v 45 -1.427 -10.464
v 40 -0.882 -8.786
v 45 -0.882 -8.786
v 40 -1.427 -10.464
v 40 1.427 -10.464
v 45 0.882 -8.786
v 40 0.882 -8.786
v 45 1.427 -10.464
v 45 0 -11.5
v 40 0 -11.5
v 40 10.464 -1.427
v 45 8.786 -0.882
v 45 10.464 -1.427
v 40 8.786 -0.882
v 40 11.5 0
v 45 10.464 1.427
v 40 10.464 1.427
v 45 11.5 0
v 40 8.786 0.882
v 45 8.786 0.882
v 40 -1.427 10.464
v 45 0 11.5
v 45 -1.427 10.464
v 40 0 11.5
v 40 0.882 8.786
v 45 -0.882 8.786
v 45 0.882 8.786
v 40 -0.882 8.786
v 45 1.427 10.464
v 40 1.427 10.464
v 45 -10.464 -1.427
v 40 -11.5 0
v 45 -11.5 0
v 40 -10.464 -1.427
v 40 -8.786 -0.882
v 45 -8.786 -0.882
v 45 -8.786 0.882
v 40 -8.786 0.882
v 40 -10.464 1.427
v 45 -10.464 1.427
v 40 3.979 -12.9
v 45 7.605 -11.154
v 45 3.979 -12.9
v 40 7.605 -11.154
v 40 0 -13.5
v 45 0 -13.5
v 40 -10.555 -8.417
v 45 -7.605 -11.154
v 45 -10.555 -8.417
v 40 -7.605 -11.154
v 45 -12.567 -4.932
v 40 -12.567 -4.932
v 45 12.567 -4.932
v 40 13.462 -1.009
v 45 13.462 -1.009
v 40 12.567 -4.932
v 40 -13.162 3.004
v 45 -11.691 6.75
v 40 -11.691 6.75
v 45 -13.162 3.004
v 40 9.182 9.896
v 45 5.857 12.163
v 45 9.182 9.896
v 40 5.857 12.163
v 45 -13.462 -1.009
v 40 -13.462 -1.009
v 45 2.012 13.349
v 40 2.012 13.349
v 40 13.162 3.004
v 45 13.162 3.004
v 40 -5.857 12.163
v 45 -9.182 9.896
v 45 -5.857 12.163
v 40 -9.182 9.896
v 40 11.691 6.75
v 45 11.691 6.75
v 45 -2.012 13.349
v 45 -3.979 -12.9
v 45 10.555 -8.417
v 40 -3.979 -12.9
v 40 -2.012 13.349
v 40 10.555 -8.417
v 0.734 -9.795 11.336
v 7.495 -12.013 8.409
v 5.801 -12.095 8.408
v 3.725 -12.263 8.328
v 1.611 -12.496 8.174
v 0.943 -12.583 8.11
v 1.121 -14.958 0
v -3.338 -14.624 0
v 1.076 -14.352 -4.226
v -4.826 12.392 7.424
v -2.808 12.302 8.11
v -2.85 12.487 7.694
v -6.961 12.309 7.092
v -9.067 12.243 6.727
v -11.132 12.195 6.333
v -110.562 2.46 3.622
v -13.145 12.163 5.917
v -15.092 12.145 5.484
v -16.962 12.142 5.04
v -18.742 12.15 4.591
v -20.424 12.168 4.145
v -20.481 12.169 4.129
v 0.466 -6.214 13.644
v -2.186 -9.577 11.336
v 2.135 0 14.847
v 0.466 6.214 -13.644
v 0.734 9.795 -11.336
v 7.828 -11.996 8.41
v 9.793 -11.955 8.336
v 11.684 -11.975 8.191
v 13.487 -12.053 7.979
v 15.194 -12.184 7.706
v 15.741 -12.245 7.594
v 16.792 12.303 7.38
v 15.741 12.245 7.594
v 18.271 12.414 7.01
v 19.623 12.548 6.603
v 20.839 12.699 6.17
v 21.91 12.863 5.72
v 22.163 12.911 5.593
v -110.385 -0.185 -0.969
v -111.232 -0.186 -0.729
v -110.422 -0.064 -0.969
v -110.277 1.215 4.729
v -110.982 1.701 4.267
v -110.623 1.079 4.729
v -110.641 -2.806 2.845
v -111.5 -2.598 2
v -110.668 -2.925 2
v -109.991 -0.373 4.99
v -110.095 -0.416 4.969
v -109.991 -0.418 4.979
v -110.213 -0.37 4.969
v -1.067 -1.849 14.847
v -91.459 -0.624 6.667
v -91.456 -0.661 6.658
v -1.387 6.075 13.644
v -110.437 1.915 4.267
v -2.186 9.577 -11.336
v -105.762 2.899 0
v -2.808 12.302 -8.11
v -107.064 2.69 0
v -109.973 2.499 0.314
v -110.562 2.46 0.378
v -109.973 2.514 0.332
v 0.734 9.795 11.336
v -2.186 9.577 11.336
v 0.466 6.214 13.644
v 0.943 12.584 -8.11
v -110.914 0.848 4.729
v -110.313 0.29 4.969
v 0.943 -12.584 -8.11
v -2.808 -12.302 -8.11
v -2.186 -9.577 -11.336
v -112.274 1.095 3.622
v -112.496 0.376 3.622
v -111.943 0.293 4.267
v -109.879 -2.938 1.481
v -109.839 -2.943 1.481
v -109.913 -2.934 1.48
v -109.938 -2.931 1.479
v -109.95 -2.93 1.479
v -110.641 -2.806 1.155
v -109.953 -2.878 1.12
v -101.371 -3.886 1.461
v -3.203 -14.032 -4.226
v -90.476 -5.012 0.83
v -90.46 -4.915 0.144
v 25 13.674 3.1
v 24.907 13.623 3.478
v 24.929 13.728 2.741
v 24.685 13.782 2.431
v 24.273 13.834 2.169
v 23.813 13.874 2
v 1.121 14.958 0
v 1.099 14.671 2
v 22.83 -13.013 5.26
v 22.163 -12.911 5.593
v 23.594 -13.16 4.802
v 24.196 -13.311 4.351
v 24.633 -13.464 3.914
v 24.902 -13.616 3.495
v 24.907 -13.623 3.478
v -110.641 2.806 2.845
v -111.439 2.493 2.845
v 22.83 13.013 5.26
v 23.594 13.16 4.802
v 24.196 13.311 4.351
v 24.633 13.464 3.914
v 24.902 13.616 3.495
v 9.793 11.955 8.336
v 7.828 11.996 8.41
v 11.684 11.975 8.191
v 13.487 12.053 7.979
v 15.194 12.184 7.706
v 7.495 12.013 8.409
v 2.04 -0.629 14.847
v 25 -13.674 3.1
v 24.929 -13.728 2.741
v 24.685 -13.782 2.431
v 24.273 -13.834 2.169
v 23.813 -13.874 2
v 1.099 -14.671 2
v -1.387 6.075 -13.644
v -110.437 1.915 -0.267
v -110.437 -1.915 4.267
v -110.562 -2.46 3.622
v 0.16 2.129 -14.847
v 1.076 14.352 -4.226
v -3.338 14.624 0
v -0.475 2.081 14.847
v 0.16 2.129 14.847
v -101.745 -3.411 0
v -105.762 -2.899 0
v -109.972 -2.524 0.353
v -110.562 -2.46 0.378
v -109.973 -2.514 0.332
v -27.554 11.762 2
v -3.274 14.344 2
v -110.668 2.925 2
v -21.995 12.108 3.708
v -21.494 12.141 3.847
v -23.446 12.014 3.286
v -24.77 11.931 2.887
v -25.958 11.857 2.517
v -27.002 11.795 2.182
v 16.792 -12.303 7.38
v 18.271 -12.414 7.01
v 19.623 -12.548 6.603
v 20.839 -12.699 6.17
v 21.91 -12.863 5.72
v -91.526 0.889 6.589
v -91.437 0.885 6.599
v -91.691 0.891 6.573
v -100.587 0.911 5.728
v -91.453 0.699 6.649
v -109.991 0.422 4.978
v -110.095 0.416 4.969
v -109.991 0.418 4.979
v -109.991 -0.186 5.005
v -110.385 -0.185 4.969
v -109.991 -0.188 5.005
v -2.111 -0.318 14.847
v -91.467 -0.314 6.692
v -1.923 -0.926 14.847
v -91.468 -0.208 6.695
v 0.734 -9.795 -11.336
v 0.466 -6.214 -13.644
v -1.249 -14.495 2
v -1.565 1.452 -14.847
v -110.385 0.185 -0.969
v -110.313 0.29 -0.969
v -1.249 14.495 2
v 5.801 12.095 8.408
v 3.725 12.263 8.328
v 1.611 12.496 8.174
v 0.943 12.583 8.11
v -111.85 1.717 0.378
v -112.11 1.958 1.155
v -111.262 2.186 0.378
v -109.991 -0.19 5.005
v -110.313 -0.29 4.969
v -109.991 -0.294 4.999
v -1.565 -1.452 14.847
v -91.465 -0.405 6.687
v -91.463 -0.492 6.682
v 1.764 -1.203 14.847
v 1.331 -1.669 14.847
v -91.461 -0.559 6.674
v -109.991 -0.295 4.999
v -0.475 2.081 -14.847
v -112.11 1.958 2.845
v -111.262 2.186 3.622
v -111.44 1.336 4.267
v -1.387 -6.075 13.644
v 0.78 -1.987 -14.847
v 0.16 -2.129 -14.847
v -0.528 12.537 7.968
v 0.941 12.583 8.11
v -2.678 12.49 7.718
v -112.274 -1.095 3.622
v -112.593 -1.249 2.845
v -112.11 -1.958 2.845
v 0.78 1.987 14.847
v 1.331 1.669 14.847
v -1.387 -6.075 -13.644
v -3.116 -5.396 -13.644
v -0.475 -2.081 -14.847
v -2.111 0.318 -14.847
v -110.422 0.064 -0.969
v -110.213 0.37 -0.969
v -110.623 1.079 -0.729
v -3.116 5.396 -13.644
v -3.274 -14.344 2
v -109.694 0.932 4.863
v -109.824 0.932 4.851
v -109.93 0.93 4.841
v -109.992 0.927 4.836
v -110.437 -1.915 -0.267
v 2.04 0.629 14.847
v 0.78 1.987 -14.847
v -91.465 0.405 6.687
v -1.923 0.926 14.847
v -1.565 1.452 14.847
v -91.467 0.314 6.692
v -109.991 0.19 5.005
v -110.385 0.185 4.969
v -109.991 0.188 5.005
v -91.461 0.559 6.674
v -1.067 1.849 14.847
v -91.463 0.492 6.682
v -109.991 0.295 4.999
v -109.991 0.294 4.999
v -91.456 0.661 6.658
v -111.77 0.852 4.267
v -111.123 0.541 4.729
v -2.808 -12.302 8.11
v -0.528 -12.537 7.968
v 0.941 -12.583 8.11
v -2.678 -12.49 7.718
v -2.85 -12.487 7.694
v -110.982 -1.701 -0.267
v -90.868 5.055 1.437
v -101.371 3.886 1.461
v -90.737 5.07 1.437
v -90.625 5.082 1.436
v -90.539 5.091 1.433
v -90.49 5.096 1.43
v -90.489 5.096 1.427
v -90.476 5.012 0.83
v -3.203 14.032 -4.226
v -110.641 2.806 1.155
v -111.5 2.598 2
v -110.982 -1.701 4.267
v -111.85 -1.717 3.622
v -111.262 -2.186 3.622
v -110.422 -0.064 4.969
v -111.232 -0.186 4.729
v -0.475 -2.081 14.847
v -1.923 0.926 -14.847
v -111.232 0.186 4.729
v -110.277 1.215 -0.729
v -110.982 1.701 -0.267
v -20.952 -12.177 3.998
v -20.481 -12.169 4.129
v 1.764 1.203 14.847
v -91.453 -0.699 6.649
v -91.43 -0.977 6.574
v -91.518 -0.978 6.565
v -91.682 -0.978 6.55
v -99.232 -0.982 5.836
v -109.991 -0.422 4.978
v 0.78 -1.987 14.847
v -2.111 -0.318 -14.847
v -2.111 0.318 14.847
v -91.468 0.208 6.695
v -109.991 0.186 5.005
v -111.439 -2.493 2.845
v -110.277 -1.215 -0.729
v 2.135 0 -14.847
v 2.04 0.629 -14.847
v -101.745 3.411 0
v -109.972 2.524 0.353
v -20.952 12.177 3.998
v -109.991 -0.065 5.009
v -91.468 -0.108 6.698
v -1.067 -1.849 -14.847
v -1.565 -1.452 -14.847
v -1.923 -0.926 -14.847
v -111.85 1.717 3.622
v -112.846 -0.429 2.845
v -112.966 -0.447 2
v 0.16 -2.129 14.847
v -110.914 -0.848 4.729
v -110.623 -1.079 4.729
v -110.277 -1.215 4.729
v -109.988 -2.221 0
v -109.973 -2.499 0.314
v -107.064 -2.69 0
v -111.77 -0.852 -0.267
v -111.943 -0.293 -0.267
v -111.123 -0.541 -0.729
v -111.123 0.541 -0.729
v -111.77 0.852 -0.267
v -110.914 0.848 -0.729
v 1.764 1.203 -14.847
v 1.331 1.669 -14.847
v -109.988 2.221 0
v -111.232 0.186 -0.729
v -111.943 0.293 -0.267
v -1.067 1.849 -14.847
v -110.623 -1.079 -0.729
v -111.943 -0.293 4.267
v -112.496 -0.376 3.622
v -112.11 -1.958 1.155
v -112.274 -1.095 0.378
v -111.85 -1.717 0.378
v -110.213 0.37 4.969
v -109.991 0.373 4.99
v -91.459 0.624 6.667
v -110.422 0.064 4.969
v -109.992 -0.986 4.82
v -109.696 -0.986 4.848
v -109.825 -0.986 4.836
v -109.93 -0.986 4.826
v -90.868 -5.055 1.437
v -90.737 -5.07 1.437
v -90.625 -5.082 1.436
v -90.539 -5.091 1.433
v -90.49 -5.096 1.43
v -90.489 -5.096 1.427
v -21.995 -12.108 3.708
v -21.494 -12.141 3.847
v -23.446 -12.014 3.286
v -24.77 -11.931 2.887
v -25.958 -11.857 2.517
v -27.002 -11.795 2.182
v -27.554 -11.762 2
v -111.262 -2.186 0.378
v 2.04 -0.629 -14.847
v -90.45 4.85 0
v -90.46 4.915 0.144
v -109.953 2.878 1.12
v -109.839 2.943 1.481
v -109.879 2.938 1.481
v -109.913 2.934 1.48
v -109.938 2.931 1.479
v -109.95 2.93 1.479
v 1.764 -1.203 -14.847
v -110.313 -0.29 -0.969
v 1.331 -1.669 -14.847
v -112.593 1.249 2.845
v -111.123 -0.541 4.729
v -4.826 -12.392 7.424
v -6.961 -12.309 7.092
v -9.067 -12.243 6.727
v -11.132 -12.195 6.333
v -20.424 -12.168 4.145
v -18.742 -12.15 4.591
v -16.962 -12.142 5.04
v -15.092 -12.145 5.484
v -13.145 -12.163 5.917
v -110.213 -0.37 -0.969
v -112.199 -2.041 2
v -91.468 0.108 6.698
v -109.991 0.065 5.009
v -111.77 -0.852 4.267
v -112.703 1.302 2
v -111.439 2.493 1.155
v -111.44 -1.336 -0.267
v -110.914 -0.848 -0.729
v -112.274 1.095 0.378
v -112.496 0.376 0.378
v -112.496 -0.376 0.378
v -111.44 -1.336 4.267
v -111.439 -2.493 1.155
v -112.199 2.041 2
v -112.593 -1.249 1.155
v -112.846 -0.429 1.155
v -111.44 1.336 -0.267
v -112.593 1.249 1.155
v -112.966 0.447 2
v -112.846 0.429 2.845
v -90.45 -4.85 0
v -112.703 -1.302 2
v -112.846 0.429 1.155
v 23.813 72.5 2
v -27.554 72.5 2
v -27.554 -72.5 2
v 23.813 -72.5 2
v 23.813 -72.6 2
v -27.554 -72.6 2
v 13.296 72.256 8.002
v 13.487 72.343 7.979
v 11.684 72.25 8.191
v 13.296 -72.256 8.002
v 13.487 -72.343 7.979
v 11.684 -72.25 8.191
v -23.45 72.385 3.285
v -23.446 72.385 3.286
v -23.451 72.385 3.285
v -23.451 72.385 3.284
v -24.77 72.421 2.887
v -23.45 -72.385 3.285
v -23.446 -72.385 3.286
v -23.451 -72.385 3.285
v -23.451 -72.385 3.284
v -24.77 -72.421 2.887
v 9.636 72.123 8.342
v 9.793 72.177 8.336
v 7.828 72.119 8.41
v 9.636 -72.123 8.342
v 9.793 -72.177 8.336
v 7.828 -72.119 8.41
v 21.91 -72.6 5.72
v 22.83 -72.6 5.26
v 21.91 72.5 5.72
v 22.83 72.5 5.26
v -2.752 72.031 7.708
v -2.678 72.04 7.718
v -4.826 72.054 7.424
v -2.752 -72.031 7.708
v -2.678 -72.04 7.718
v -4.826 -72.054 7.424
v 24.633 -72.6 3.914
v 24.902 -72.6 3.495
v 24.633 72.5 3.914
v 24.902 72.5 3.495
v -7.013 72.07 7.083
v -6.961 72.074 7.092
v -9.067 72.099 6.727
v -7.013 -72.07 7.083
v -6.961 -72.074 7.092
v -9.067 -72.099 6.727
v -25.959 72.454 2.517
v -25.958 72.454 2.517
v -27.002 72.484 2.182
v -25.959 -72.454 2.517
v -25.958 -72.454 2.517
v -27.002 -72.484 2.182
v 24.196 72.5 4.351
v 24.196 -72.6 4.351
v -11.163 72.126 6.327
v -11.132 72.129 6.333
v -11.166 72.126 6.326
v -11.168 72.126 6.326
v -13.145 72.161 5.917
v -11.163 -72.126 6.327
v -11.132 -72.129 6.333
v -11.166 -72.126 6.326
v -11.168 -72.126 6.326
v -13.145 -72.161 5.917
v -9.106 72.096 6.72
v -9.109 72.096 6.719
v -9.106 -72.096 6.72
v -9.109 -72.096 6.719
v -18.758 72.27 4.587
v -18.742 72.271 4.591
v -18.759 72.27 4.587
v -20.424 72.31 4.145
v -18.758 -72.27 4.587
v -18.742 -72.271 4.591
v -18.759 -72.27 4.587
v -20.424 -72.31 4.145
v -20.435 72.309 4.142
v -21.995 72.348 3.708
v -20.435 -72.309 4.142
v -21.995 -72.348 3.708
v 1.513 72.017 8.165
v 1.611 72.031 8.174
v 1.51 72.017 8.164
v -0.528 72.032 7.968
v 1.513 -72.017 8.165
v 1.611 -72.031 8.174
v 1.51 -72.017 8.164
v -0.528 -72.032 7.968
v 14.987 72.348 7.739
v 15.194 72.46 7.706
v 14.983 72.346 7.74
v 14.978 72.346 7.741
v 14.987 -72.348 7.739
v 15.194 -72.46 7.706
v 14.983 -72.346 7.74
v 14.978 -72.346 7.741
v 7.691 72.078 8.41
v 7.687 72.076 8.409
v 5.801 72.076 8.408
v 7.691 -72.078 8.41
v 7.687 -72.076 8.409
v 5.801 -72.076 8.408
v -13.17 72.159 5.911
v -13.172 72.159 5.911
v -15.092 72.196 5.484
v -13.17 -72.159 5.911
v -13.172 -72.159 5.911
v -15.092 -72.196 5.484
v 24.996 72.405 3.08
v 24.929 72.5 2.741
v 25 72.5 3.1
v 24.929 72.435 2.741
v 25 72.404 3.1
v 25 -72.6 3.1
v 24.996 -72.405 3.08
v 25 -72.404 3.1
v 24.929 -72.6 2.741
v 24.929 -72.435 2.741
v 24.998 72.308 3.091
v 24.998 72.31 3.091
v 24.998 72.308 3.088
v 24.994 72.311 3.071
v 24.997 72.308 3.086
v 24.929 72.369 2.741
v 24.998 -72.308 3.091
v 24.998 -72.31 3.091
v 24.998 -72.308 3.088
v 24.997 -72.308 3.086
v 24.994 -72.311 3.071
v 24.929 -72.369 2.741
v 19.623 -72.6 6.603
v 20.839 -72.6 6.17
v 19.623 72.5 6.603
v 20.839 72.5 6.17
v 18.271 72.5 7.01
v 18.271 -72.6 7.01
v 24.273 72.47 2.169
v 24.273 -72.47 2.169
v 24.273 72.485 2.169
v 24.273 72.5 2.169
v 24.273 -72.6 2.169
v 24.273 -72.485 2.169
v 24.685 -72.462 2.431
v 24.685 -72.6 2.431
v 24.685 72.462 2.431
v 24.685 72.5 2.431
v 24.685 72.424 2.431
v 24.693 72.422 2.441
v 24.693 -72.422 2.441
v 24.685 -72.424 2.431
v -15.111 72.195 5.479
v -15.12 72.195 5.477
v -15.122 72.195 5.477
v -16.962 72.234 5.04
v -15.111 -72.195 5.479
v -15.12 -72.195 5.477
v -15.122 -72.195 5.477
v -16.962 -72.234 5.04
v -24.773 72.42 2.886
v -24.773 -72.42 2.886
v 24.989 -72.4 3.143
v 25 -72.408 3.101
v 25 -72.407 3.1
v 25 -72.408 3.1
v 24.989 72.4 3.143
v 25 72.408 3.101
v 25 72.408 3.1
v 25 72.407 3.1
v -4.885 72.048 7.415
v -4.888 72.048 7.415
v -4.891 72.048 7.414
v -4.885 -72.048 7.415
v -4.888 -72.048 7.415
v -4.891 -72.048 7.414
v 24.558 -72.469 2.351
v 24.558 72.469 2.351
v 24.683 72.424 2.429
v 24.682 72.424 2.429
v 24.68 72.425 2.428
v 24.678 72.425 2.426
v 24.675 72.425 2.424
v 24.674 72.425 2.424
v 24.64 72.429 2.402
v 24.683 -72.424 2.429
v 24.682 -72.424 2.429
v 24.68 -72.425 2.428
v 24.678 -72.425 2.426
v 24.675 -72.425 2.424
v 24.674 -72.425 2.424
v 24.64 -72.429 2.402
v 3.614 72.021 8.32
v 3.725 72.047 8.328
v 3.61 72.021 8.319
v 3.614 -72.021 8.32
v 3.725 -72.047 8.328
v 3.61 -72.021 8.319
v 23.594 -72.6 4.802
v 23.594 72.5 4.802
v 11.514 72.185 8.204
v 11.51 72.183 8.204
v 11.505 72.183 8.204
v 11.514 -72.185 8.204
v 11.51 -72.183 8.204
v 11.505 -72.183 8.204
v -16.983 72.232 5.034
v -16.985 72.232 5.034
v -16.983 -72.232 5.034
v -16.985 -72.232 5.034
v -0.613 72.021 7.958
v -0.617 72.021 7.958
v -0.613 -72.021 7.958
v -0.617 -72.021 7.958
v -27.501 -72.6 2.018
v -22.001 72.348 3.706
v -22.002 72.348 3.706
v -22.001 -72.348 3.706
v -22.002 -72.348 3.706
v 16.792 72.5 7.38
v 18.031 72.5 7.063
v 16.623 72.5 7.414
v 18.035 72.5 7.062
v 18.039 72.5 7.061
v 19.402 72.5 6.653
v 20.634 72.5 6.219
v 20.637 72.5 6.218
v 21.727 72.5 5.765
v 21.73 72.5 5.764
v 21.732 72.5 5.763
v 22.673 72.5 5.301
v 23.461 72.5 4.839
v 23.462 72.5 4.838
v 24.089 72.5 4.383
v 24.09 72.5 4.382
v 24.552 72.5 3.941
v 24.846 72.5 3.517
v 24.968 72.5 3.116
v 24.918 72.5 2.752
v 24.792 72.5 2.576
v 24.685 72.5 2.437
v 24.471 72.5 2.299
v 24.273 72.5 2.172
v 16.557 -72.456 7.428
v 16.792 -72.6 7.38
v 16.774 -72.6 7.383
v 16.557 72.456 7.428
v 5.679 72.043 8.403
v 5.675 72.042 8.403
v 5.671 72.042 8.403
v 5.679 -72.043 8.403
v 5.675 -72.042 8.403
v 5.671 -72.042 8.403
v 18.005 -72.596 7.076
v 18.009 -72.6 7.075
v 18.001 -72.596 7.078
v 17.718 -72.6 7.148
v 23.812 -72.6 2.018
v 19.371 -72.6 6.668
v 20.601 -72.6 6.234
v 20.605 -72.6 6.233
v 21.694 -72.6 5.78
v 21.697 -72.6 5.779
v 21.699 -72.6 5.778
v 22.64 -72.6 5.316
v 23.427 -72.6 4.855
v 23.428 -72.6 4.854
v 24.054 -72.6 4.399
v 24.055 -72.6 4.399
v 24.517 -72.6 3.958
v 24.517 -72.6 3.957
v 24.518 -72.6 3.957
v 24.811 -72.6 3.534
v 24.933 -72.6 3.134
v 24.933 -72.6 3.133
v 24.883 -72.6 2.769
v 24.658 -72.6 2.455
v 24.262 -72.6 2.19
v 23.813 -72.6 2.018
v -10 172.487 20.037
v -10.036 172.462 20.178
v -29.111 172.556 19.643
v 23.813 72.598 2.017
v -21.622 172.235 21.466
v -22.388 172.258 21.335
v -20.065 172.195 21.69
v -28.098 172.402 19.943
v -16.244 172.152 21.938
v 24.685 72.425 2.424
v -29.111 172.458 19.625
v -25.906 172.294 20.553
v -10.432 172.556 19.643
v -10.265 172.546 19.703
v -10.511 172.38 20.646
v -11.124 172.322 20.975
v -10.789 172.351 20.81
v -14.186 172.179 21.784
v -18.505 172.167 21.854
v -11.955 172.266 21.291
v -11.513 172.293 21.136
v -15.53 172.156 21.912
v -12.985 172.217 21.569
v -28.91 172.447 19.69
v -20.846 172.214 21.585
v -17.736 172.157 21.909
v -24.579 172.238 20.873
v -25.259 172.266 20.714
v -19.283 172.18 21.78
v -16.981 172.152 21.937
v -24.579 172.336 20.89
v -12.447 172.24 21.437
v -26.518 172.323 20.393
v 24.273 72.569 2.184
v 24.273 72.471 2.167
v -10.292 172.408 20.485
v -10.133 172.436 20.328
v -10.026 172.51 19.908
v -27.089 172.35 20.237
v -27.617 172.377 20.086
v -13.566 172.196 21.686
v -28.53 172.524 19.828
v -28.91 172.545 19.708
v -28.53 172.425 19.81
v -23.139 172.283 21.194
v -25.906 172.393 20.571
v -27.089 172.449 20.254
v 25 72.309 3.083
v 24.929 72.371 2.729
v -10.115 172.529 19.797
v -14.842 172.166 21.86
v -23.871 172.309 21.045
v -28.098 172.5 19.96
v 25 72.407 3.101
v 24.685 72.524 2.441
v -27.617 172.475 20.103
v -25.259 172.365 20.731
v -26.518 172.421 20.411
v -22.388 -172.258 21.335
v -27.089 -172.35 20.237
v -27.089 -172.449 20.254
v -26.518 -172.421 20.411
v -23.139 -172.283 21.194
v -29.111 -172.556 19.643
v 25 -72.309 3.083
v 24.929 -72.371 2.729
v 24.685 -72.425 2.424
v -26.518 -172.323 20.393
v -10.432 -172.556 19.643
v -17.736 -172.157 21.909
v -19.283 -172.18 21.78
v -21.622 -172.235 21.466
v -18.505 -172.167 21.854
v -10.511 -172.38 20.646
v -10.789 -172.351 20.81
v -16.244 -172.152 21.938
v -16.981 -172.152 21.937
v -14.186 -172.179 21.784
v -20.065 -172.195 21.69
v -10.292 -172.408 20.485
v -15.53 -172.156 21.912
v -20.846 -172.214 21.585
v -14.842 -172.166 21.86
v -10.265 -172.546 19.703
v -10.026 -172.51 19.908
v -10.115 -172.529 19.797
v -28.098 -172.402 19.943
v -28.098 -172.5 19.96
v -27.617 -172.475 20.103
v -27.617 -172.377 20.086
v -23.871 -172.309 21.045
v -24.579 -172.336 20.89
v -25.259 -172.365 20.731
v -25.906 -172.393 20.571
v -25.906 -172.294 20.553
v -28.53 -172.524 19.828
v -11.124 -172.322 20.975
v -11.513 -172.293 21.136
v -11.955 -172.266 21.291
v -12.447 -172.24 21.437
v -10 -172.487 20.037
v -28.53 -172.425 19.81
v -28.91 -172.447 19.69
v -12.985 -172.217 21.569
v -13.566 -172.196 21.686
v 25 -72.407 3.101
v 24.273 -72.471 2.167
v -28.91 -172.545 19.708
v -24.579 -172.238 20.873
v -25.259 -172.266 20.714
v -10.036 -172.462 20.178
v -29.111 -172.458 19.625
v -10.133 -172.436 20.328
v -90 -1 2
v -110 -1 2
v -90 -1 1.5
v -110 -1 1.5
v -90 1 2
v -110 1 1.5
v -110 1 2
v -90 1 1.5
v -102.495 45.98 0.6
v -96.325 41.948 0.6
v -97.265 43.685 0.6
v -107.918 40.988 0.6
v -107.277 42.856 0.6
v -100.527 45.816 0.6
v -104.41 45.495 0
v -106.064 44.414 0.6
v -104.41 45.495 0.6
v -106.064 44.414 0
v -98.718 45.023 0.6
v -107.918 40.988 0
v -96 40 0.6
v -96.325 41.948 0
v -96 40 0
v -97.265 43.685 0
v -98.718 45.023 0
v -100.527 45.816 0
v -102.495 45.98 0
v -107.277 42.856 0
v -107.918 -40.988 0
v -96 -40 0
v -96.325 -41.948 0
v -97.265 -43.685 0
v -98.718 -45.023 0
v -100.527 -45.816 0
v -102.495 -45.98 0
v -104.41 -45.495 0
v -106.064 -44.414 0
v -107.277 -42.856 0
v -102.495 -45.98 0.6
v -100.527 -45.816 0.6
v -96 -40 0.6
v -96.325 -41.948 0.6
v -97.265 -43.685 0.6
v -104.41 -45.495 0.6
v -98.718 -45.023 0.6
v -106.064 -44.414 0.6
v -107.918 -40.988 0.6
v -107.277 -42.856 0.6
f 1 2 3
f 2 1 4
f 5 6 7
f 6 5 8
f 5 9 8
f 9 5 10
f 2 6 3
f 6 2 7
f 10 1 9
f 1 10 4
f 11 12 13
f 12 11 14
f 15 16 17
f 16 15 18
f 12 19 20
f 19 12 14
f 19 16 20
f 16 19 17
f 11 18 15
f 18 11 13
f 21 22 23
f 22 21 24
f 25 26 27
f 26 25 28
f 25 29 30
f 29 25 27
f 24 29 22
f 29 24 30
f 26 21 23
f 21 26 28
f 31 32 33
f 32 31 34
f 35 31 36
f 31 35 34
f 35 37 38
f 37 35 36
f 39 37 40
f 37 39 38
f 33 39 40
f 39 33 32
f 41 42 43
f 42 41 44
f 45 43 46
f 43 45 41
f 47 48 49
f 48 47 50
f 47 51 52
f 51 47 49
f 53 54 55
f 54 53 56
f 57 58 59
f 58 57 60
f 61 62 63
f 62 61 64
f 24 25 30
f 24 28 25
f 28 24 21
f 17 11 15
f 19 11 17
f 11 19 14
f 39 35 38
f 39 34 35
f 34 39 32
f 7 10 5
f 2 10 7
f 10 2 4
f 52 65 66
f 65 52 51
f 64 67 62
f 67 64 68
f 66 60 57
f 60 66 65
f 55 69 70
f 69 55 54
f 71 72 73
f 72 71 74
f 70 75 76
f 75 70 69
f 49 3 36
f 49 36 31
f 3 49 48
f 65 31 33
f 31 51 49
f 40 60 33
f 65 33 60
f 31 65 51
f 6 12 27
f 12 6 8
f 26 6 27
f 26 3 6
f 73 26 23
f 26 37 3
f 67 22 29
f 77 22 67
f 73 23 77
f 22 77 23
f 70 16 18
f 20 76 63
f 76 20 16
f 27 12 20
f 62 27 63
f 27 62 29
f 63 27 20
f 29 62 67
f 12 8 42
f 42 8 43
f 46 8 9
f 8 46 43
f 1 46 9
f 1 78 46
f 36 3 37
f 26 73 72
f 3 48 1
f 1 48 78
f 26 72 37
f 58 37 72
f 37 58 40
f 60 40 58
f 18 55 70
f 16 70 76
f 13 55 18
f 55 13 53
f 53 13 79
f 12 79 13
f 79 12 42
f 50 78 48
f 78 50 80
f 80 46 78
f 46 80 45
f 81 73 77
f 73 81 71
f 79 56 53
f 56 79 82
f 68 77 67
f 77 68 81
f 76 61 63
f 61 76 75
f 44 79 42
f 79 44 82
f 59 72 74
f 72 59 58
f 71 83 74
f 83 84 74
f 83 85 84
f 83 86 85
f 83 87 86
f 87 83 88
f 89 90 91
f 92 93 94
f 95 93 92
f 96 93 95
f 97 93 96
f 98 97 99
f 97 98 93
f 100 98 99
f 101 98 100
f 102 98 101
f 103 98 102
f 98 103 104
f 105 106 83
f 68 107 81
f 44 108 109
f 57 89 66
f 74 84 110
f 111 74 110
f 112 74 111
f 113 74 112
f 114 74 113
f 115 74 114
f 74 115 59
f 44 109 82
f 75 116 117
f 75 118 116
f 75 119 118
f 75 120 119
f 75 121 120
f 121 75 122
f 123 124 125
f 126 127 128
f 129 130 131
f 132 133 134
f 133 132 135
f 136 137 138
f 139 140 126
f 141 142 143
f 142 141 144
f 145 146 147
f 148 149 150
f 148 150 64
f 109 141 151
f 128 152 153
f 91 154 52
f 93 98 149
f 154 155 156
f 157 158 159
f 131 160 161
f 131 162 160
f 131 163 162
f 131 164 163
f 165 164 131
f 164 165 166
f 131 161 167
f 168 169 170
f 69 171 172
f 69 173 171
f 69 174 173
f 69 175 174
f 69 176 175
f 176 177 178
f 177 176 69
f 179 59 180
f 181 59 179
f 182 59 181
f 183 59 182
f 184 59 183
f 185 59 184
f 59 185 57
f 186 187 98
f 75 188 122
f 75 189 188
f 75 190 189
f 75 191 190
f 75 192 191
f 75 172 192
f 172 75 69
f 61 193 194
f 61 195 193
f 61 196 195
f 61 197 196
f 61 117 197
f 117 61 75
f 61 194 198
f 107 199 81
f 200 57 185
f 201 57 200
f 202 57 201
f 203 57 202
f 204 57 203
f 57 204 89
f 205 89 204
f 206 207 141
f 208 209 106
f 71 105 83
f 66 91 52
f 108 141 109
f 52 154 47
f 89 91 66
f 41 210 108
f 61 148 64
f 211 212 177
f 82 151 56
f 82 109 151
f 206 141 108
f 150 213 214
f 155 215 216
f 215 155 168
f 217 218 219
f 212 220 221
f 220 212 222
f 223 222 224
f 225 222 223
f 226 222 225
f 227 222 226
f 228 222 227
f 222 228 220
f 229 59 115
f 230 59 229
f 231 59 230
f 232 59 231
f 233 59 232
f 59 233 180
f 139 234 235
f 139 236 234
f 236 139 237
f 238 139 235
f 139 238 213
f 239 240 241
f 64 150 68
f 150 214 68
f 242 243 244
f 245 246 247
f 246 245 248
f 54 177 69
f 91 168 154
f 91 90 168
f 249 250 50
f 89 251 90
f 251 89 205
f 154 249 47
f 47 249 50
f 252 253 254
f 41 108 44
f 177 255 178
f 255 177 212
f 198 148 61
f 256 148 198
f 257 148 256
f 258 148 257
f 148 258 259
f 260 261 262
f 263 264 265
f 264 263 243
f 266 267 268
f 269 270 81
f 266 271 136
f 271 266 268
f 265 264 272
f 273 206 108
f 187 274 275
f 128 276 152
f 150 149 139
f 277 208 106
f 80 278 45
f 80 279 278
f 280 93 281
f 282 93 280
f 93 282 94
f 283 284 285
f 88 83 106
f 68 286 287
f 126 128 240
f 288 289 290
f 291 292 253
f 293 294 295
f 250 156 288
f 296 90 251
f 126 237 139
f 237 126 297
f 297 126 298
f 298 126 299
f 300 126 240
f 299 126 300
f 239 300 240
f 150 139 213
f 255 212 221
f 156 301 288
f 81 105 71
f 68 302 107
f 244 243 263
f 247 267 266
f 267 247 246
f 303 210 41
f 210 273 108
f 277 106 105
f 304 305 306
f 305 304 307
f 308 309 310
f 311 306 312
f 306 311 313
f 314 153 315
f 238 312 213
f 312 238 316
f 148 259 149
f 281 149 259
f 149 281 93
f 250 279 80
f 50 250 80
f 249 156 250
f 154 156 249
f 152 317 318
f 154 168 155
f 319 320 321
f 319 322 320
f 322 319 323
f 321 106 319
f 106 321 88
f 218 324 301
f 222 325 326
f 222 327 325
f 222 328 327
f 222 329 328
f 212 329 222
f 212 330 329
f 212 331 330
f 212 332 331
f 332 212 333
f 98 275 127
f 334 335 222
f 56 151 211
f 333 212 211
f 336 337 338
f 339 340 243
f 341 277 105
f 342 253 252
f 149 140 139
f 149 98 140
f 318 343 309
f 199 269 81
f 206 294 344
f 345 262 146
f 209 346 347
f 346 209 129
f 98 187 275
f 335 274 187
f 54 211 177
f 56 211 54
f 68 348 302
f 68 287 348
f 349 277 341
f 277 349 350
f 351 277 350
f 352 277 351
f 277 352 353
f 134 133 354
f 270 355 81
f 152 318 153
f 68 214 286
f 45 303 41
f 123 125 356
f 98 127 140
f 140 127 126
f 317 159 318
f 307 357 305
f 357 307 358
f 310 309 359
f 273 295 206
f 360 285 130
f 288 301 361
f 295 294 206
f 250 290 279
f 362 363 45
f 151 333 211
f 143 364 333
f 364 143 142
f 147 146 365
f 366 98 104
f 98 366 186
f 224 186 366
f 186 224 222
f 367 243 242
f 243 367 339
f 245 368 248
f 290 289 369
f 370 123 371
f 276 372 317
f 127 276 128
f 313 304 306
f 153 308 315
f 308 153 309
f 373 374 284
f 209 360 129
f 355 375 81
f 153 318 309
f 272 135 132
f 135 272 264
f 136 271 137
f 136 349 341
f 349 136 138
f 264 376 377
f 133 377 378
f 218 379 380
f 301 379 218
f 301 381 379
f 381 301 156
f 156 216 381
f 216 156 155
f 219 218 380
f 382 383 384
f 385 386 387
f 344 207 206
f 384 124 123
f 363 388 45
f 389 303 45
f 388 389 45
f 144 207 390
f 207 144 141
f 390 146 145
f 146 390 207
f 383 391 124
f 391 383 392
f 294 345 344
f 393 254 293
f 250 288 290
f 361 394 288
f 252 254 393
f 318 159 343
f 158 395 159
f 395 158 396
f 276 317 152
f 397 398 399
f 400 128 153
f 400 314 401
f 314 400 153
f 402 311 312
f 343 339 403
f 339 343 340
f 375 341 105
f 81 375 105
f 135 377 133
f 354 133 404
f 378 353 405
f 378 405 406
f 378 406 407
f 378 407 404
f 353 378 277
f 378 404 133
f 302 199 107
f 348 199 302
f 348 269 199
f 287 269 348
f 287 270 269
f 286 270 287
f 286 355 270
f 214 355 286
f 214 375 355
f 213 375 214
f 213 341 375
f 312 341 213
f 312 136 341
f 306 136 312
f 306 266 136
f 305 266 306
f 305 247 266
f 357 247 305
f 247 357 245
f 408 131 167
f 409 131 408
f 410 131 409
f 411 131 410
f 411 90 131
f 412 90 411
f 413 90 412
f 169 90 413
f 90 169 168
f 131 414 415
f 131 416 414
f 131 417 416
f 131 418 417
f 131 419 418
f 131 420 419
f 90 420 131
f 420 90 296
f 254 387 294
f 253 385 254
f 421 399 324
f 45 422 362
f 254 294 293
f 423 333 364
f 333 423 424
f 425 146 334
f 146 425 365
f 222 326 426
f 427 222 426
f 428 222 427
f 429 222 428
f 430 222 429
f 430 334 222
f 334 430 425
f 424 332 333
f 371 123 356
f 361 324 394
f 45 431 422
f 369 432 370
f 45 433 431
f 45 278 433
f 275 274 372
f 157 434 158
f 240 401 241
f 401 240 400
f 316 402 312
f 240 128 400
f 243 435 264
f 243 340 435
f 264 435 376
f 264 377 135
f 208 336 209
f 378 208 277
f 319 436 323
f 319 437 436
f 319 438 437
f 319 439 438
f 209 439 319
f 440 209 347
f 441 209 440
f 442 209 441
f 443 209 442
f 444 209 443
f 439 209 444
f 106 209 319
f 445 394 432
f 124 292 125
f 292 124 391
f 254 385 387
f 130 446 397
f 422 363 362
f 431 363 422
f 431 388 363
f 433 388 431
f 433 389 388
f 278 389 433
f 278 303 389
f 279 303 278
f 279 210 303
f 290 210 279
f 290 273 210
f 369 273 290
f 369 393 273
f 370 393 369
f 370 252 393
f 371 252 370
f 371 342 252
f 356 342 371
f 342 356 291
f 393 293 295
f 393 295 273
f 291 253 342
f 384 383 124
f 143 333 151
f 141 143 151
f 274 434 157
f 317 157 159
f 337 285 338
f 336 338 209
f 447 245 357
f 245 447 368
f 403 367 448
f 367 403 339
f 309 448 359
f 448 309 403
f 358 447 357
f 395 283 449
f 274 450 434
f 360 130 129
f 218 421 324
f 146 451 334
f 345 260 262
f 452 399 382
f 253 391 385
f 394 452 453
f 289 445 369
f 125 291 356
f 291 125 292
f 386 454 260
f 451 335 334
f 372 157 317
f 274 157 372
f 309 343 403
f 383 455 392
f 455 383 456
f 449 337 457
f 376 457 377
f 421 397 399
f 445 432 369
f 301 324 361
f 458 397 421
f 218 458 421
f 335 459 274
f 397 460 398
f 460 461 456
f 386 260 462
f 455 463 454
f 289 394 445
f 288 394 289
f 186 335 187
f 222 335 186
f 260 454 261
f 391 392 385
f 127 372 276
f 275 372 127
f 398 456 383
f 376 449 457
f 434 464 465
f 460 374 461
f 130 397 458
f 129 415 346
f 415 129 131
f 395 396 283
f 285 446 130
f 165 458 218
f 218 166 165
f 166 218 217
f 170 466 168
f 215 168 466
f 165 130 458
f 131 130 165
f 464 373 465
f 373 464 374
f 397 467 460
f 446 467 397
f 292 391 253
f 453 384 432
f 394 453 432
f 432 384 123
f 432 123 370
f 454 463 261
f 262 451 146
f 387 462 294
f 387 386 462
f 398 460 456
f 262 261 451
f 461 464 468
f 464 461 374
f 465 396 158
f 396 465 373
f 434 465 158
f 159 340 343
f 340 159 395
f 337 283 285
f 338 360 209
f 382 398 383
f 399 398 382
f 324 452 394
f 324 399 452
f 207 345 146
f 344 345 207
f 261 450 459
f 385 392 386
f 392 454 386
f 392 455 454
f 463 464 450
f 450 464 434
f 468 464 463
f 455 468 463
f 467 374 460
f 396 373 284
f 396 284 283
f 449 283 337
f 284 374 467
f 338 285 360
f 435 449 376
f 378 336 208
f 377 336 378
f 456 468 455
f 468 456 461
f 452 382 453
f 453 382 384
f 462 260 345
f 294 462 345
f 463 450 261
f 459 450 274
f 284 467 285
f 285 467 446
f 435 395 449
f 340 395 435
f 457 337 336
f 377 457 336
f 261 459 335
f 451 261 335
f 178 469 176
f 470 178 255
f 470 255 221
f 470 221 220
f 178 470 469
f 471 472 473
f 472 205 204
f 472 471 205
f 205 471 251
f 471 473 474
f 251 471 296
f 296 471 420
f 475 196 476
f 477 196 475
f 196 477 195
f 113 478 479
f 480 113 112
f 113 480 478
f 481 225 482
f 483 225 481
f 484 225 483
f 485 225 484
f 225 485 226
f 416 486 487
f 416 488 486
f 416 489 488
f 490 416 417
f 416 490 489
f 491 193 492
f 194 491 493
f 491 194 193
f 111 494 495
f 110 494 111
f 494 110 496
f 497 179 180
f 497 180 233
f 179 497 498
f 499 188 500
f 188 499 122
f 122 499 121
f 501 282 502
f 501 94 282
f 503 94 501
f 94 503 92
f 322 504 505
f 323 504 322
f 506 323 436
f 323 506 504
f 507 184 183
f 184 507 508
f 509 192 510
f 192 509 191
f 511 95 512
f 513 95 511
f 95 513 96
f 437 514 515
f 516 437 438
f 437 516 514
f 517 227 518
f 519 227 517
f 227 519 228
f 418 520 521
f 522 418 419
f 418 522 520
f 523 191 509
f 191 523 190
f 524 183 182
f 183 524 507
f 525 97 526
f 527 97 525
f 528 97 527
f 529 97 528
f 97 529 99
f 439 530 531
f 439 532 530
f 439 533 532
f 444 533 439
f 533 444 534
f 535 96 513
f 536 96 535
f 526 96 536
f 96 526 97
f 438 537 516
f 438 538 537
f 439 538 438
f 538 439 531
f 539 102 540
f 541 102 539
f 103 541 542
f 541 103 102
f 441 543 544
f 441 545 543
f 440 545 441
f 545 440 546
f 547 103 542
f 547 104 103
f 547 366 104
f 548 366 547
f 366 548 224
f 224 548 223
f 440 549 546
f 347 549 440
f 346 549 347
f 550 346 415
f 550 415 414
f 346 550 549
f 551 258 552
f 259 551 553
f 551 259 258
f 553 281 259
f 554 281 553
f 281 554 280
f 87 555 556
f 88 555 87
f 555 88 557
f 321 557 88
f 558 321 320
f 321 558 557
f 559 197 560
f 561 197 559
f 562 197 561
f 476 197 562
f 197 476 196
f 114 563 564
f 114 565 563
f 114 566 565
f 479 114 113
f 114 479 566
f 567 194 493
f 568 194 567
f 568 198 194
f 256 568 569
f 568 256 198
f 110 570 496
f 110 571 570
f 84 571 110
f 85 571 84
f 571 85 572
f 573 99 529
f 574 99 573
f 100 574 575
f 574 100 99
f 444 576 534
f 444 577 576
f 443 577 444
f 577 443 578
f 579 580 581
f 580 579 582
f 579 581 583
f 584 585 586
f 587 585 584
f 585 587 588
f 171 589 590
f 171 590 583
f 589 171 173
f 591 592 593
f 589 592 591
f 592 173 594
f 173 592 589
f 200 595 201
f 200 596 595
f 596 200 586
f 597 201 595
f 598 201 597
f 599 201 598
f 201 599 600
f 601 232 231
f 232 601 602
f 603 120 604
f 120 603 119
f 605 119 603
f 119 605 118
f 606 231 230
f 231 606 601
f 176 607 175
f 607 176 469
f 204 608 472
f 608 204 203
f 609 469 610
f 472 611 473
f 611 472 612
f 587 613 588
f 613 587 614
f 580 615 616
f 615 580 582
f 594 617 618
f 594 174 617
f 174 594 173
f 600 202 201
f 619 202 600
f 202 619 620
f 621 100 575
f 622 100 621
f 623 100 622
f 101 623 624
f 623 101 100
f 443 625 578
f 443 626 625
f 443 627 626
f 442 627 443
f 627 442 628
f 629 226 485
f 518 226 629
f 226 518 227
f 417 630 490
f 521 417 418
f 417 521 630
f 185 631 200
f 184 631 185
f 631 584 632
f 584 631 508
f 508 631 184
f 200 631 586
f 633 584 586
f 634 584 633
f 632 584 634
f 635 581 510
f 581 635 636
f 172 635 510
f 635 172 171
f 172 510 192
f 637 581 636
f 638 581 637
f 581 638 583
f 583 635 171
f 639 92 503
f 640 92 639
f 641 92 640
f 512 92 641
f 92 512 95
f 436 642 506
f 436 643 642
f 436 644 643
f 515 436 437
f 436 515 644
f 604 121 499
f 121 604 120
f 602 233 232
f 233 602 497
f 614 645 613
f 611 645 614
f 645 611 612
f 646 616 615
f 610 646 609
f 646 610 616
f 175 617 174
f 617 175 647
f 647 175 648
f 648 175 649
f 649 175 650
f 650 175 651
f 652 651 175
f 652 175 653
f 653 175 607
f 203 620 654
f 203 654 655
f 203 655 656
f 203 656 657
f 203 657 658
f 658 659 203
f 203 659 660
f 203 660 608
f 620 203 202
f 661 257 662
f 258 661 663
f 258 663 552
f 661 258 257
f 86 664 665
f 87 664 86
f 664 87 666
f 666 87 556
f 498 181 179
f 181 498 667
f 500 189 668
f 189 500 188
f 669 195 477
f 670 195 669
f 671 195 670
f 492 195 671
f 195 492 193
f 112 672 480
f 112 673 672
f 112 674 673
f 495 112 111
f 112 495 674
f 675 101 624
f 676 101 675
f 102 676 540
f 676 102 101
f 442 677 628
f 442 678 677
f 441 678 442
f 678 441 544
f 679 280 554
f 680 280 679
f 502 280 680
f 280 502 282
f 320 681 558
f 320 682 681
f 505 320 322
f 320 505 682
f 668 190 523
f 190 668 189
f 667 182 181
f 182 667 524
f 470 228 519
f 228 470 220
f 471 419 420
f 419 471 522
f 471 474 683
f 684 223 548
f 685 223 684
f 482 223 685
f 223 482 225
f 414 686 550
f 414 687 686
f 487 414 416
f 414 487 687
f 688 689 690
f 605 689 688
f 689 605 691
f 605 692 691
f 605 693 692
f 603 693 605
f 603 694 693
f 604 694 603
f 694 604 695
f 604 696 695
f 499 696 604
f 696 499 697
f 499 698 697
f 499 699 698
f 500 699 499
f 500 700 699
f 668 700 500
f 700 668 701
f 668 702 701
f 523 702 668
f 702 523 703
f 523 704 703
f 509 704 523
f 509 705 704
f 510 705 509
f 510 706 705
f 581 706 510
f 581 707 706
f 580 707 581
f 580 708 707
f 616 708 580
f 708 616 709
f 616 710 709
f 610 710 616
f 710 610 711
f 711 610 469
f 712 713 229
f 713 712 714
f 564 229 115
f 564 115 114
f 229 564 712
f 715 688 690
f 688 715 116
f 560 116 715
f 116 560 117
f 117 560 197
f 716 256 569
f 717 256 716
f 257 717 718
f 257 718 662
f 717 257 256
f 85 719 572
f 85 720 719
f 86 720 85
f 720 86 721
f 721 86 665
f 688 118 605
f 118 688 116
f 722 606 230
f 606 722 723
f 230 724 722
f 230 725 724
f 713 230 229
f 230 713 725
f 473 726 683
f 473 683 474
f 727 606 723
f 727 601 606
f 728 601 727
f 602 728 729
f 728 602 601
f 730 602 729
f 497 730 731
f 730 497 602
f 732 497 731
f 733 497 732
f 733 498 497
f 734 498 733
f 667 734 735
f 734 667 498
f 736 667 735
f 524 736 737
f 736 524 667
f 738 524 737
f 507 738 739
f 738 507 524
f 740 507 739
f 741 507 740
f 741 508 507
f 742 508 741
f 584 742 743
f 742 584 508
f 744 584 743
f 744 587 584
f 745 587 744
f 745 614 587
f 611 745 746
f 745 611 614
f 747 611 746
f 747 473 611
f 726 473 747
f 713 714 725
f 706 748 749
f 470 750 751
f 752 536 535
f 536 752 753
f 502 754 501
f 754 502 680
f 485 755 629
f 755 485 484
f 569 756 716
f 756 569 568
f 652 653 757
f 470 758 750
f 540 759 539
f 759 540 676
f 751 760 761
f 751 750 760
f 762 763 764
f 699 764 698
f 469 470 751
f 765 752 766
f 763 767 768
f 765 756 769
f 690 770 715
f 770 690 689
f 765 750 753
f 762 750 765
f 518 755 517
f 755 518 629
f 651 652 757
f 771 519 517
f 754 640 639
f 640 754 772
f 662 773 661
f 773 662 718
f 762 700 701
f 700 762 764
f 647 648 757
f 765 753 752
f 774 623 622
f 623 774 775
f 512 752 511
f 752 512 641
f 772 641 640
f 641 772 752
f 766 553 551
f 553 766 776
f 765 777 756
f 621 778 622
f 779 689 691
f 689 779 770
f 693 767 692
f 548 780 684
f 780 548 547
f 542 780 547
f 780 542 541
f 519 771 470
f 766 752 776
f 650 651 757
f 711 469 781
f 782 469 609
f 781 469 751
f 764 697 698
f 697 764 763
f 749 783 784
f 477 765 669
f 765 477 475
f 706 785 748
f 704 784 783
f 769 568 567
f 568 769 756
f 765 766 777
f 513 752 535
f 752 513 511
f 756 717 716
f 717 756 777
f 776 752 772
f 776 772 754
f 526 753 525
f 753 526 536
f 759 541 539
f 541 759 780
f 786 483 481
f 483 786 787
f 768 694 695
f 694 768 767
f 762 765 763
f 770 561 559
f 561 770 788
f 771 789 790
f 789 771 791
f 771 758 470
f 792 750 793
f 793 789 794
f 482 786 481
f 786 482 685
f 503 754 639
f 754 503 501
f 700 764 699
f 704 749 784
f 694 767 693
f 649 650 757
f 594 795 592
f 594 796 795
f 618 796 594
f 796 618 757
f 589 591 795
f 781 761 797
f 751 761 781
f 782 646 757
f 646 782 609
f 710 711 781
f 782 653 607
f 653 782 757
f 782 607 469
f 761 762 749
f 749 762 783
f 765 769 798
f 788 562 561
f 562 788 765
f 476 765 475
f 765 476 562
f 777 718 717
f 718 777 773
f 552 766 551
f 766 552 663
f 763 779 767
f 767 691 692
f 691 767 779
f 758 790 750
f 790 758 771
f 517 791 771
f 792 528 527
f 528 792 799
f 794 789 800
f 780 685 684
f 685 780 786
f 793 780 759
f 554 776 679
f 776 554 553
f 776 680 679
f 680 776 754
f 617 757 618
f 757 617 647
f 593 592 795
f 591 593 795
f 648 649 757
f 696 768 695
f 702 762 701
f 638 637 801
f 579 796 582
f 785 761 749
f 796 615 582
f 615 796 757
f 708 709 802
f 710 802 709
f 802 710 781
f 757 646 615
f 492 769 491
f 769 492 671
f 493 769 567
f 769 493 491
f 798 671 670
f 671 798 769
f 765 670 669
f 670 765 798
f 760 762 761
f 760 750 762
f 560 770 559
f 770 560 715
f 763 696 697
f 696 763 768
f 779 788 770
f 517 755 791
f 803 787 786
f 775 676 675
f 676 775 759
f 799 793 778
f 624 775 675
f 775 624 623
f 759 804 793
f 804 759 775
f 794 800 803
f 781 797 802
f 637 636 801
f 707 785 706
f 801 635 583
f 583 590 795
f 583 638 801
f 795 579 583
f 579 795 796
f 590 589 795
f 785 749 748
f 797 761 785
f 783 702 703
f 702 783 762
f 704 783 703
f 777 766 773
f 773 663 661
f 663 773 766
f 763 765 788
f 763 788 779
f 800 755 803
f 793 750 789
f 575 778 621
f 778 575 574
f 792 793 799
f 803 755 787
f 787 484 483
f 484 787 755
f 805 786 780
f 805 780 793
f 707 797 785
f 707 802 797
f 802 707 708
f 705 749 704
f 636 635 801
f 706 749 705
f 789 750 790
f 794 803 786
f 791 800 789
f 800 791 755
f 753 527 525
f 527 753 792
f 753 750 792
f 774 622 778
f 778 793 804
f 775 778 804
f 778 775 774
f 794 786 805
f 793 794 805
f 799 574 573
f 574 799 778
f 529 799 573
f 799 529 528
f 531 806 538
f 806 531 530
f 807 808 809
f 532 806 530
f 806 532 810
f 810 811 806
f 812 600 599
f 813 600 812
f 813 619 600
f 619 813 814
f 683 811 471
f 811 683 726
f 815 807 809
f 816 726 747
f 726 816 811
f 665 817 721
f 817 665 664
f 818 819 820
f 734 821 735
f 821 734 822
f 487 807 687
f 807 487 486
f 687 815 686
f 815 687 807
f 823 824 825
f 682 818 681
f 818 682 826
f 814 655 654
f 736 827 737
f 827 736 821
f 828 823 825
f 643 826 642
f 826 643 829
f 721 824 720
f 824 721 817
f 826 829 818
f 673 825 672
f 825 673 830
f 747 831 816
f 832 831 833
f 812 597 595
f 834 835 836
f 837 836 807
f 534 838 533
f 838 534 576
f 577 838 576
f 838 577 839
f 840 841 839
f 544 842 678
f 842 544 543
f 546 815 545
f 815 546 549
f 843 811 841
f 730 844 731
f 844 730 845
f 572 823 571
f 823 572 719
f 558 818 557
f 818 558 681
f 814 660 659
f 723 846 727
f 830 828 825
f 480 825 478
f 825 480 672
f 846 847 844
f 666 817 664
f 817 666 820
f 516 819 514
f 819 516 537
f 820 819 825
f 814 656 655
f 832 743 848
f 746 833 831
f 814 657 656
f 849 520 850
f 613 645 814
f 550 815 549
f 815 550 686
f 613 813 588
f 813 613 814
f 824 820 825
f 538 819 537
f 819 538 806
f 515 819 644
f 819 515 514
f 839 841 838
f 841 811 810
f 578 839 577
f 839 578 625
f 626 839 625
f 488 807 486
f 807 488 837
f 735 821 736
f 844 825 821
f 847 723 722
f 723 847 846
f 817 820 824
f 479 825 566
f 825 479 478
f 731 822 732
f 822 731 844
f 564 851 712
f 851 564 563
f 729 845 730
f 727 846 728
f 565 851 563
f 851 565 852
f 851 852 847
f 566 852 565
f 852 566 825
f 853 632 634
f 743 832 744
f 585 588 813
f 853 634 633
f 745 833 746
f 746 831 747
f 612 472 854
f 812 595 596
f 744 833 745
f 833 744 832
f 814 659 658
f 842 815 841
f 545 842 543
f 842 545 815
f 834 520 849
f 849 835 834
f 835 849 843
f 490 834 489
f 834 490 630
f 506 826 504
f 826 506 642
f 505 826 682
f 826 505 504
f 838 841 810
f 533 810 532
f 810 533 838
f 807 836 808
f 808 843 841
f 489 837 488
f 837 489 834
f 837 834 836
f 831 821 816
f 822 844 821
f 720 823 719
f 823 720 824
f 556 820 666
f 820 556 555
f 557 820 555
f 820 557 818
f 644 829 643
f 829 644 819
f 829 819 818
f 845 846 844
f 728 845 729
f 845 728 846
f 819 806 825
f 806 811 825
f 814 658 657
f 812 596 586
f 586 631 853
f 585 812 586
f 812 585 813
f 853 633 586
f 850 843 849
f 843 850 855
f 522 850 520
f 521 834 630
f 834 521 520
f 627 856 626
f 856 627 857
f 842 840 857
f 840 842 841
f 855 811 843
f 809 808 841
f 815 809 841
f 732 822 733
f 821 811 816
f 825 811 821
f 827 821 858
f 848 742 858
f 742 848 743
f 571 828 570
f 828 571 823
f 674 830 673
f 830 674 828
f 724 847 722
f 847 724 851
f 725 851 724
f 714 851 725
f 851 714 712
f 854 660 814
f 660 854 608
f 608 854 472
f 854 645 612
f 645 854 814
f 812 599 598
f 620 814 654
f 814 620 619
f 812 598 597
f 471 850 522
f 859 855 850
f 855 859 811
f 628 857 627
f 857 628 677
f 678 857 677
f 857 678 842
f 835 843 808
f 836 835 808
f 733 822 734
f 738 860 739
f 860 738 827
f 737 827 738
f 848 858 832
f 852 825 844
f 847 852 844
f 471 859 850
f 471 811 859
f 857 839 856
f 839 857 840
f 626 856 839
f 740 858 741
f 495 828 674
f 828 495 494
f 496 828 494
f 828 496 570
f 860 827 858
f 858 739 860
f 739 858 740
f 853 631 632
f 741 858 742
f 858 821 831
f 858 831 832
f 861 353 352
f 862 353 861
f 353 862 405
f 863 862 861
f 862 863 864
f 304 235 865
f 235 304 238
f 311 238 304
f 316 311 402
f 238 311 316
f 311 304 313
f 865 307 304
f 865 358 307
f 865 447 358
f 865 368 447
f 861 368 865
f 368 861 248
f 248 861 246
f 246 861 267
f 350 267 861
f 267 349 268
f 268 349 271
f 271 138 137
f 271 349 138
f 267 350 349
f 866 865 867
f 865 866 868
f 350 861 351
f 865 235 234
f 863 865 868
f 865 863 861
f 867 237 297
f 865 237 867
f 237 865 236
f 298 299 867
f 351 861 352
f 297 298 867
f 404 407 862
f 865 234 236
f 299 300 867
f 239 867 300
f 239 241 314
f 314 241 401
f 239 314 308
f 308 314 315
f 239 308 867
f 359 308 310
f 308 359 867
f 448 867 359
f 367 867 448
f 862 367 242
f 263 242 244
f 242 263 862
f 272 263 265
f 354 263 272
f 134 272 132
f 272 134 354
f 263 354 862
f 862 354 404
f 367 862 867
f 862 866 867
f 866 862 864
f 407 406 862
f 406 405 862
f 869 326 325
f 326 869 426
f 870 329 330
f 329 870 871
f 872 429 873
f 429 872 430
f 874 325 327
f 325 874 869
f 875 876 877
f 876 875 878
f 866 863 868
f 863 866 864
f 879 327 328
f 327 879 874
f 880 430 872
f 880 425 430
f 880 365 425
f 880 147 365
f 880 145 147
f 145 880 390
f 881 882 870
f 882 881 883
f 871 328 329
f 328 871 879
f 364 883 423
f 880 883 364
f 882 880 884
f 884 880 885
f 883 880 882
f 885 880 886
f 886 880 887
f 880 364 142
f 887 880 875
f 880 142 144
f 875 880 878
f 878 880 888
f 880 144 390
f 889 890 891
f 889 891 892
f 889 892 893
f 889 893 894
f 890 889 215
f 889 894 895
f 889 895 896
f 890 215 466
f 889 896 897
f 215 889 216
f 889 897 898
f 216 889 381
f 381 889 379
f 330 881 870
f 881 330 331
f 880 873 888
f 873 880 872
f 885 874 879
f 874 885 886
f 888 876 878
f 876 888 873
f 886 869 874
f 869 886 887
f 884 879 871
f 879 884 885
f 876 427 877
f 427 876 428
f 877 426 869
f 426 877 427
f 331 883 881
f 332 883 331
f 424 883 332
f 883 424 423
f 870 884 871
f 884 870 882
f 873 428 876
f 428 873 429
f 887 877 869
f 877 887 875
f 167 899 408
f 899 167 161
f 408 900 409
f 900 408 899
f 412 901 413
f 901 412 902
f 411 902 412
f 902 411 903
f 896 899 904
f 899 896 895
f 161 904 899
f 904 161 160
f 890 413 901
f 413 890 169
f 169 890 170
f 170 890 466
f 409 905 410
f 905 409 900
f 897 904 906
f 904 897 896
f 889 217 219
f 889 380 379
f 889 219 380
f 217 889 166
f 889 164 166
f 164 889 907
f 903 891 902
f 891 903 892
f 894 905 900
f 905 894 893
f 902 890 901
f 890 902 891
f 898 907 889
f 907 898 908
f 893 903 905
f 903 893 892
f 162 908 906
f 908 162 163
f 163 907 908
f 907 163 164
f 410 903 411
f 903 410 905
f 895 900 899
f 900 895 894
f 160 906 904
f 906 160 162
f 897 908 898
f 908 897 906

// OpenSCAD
/*
	Openscad glider.

    Copyright (C) Tim Molteno, tim@molteno.net

    
    This program is free software: you can redistribute it and/or modify
    it under the terms of the GNU General Public License as published by
    the Free Software Foundation, either version 3 of the License, or
    (at your option) any later version.

    This program is distributed in the hope that it will be useful,
    but WITHOUT ANY WARRANTY; without even the implied warranty of
    MERCHANTABILITY or FITNESS FOR A PARTICULAR PURPOSE.  See the
    GNU General Public License for more details.

    You should have received a copy of the GNU General Public License
    along with this program.  If not, see <http://www.gnu.org/licenses/>.
*/

/* NACA 5412 Airfoil M=5.0% P=40.0% T=12.0% */

module airfoil(s) {
rotate([0,0,2]) scale([s,s,s]) mirror([1,0])  polygon(points=[
 [1.000000,-0.000000], [0.998459, 0.000480], [0.993844, 0.001912], [0.986185, 0.004266],
 [0.975528, 0.007497], [0.961940, 0.011541], [0.945503, 0.016321], [0.926320, 0.021747],
 [0.904508, 0.027720], [0.880203, 0.034131], [0.853553, 0.040868], [0.824724, 0.047815],
 [0.793893, 0.054856], [0.761249, 0.061875], [0.726995, 0.068760], [0.691342, 0.075399],
 [0.654508, 0.081690], [0.616723, 0.087531], [0.578217, 0.092831], [0.539230, 0.097504],
 [0.500000, 0.101473], [0.460770, 0.104671], [0.421783, 0.107042], [0.383277, 0.108495],
 [0.345492, 0.108628], [0.308658, 0.107381], [0.273005, 0.104801], [0.238751, 0.100962],
 [0.206107, 0.095964], [0.175276, 0.089926], [0.146447, 0.082992], [0.119797, 0.075318],
 [0.095492, 0.067072], [0.073680, 0.058429], [0.054497, 0.049563], [0.038060, 0.040642],
 [0.024472, 0.031824], [0.013815, 0.023248], [0.006156, 0.015030], [0.001541, 0.007261],
 [0.000000, 0.000000], [0.001541,-0.006492], [0.006156,-0.011976], [0.013815,-0.016460],
 [0.024472,-0.019963], [0.038060,-0.022517], [0.054497,-0.024170], [0.073680,-0.024982],
 [0.095492,-0.025026], [0.119797,-0.024389], [0.146447,-0.023173], [0.175276,-0.021490],
 [0.206107,-0.019460], [0.238751,-0.017213], [0.273005,-0.014881], [0.308658,-0.012596],
 [0.345492,-0.010485], [0.383277,-0.008670], [0.421783,-0.007174], [0.460770,-0.005697],
 [0.500000,-0.004250], [0.539230,-0.002888], [0.578217,-0.001653], [0.616723,-0.000578],
 [0.654508, 0.000317], [0.691342, 0.001023], [0.726995, 0.001539], [0.761249, 0.001875],
 [0.793893, 0.002047], [0.824724, 0.002077], [0.853553, 0.001991], [0.880203, 0.001815],
 [0.904508, 0.001578], [0.926320, 0.001305], [0.945503, 0.001019], [0.961940, 0.000743],
 [0.975528, 0.000494], [0.986185, 0.000286], [0.993844, 0.000130], [0.998459, 0.000033],
 [1.000000, 0.000000]]);
}

/* This is a foil with a flat bottom for easy printing */
module flat_foil(s) {
  difference() {
    translate([0,0.02*s, 0]) linear_extrude(height=0.1) airfoil(s);
    translate([-s, -s-5, -1]) cube([s+5,s+5,2]);
  }
}
	
wingspan = 145;
tail_length = 90;
nose_length = 40;

wing_x = 25;
wing_chord = 55;
wing_z = 2;

module wing_left() {
  rotate([90,0,0]) hull() {
     translate([-35,0,0.7*wingspan]) flat_foil(20);
     flat_foil(wing_chord);
    }
}

module wing_center() {
  rotate([90,0,0]) hull() {
     translate([0,0,wingspan/2]) flat_foil(wing_chord);
     translate([0,0,-wingspan/2]) flat_foil(wing_chord);
    }
}


module wing_right() {
  mirror([0,1,0]) wing_left();
}

module wings() {
    translate([wing_x,0,wing_z]) {
      wing_center();
      translate([0, wingspan/2,0]) rotate([10,0,0]) wing_right();
      translate([0, -wingspan/2,0]) rotate([-10,0,0])  wing_left();
    }
}




/** FUSELAGE **/

module motor_mount() {
  difference() {
    union() {
      cylinder(r=6.5, h=10);
      translate([0,0,0.75]) cube([26,7 ,1.5], center=true);
      translate([0,0,0.75]) cube([7, 26,1.5], center=true);
    }
    cylinder(r=4, h=12, center=true);
    for (angle = [0,90,180,270]) {
      rotate(angle) translate([10,0,0]) cylinder(r=1.5, h=5, center=true);
    }
  }
}

/* Turnigy 2730-1500 */
module motor() {
  rotate([0,90,0]) {
    motor_mount();
    cylinder(r=1.5, h=42); // shaft
    translate([0,0,3]) cylinder(r=4, h=15); // housing
    translate([0,0,18]) cylinder(r=13.5, h=10); // outrunner
    translate([0,0,28]) cylinder(r=4, h=4.5); // forward housing
  }
}

module firewall() {
   rotate([0,90,0]) difference() {
	cylinder(r=13.5, h=5, $fn=21);
    for (angle = [0,90,180,270]) {
      rotate(angle) translate([10,0,0]) cylinder(r=1.5, h=12, center=true);
    }
  }
}

module fuselage_plain() {
    %translate([nose_length+5,0,0]) motor();
    translate([nose_length,0,0]) firewall();
    hull() {
      translate([nose_length-5,0,0]) firewall();
      sphere(r=15, $fn=21);
      translate([-tail_length-20,0,2]) sphere(r=3, $fn=21);
    }
}

module fuselage() {
  difference() {
    fuselage_plain();
    wings();
    translate([-tail_length,0,0]) stabilizer_vert();
  }
}



/** STABILIZERS **/

module stabilizer_right() {
  hull() {
    translate([-20,0,0]) cube([20,2,1.5]);
    translate([-12, 40, 0]) cylinder(r=6, h=0.6);
  }
}

module stabilizer_left() {
  mirror([0,1,0]) stabilizer_right();
}

module stabilizer_vert() {
  translate([-20,0,0])
  hull() {
    translate([0, -1, 1]) cube([20,2,1]);
    translate([4, 0, 40]) rotate([90,0,0]) cylinder(r=4, h=0.8);
  }
}


/* This is the whole plane, as assembled. To print, you
   must generate a separate .stl for each of these parts
*/
module plane() {
  union() {
    fuselage();
    wings();
    translate([-tail_length,0,0]) stabilizer_right();
    translate([-tail_length,0,0]) stabilizer_left();
    %translate([-tail_length,0,0]) stabilizer_vert();
  }
}

plane();
